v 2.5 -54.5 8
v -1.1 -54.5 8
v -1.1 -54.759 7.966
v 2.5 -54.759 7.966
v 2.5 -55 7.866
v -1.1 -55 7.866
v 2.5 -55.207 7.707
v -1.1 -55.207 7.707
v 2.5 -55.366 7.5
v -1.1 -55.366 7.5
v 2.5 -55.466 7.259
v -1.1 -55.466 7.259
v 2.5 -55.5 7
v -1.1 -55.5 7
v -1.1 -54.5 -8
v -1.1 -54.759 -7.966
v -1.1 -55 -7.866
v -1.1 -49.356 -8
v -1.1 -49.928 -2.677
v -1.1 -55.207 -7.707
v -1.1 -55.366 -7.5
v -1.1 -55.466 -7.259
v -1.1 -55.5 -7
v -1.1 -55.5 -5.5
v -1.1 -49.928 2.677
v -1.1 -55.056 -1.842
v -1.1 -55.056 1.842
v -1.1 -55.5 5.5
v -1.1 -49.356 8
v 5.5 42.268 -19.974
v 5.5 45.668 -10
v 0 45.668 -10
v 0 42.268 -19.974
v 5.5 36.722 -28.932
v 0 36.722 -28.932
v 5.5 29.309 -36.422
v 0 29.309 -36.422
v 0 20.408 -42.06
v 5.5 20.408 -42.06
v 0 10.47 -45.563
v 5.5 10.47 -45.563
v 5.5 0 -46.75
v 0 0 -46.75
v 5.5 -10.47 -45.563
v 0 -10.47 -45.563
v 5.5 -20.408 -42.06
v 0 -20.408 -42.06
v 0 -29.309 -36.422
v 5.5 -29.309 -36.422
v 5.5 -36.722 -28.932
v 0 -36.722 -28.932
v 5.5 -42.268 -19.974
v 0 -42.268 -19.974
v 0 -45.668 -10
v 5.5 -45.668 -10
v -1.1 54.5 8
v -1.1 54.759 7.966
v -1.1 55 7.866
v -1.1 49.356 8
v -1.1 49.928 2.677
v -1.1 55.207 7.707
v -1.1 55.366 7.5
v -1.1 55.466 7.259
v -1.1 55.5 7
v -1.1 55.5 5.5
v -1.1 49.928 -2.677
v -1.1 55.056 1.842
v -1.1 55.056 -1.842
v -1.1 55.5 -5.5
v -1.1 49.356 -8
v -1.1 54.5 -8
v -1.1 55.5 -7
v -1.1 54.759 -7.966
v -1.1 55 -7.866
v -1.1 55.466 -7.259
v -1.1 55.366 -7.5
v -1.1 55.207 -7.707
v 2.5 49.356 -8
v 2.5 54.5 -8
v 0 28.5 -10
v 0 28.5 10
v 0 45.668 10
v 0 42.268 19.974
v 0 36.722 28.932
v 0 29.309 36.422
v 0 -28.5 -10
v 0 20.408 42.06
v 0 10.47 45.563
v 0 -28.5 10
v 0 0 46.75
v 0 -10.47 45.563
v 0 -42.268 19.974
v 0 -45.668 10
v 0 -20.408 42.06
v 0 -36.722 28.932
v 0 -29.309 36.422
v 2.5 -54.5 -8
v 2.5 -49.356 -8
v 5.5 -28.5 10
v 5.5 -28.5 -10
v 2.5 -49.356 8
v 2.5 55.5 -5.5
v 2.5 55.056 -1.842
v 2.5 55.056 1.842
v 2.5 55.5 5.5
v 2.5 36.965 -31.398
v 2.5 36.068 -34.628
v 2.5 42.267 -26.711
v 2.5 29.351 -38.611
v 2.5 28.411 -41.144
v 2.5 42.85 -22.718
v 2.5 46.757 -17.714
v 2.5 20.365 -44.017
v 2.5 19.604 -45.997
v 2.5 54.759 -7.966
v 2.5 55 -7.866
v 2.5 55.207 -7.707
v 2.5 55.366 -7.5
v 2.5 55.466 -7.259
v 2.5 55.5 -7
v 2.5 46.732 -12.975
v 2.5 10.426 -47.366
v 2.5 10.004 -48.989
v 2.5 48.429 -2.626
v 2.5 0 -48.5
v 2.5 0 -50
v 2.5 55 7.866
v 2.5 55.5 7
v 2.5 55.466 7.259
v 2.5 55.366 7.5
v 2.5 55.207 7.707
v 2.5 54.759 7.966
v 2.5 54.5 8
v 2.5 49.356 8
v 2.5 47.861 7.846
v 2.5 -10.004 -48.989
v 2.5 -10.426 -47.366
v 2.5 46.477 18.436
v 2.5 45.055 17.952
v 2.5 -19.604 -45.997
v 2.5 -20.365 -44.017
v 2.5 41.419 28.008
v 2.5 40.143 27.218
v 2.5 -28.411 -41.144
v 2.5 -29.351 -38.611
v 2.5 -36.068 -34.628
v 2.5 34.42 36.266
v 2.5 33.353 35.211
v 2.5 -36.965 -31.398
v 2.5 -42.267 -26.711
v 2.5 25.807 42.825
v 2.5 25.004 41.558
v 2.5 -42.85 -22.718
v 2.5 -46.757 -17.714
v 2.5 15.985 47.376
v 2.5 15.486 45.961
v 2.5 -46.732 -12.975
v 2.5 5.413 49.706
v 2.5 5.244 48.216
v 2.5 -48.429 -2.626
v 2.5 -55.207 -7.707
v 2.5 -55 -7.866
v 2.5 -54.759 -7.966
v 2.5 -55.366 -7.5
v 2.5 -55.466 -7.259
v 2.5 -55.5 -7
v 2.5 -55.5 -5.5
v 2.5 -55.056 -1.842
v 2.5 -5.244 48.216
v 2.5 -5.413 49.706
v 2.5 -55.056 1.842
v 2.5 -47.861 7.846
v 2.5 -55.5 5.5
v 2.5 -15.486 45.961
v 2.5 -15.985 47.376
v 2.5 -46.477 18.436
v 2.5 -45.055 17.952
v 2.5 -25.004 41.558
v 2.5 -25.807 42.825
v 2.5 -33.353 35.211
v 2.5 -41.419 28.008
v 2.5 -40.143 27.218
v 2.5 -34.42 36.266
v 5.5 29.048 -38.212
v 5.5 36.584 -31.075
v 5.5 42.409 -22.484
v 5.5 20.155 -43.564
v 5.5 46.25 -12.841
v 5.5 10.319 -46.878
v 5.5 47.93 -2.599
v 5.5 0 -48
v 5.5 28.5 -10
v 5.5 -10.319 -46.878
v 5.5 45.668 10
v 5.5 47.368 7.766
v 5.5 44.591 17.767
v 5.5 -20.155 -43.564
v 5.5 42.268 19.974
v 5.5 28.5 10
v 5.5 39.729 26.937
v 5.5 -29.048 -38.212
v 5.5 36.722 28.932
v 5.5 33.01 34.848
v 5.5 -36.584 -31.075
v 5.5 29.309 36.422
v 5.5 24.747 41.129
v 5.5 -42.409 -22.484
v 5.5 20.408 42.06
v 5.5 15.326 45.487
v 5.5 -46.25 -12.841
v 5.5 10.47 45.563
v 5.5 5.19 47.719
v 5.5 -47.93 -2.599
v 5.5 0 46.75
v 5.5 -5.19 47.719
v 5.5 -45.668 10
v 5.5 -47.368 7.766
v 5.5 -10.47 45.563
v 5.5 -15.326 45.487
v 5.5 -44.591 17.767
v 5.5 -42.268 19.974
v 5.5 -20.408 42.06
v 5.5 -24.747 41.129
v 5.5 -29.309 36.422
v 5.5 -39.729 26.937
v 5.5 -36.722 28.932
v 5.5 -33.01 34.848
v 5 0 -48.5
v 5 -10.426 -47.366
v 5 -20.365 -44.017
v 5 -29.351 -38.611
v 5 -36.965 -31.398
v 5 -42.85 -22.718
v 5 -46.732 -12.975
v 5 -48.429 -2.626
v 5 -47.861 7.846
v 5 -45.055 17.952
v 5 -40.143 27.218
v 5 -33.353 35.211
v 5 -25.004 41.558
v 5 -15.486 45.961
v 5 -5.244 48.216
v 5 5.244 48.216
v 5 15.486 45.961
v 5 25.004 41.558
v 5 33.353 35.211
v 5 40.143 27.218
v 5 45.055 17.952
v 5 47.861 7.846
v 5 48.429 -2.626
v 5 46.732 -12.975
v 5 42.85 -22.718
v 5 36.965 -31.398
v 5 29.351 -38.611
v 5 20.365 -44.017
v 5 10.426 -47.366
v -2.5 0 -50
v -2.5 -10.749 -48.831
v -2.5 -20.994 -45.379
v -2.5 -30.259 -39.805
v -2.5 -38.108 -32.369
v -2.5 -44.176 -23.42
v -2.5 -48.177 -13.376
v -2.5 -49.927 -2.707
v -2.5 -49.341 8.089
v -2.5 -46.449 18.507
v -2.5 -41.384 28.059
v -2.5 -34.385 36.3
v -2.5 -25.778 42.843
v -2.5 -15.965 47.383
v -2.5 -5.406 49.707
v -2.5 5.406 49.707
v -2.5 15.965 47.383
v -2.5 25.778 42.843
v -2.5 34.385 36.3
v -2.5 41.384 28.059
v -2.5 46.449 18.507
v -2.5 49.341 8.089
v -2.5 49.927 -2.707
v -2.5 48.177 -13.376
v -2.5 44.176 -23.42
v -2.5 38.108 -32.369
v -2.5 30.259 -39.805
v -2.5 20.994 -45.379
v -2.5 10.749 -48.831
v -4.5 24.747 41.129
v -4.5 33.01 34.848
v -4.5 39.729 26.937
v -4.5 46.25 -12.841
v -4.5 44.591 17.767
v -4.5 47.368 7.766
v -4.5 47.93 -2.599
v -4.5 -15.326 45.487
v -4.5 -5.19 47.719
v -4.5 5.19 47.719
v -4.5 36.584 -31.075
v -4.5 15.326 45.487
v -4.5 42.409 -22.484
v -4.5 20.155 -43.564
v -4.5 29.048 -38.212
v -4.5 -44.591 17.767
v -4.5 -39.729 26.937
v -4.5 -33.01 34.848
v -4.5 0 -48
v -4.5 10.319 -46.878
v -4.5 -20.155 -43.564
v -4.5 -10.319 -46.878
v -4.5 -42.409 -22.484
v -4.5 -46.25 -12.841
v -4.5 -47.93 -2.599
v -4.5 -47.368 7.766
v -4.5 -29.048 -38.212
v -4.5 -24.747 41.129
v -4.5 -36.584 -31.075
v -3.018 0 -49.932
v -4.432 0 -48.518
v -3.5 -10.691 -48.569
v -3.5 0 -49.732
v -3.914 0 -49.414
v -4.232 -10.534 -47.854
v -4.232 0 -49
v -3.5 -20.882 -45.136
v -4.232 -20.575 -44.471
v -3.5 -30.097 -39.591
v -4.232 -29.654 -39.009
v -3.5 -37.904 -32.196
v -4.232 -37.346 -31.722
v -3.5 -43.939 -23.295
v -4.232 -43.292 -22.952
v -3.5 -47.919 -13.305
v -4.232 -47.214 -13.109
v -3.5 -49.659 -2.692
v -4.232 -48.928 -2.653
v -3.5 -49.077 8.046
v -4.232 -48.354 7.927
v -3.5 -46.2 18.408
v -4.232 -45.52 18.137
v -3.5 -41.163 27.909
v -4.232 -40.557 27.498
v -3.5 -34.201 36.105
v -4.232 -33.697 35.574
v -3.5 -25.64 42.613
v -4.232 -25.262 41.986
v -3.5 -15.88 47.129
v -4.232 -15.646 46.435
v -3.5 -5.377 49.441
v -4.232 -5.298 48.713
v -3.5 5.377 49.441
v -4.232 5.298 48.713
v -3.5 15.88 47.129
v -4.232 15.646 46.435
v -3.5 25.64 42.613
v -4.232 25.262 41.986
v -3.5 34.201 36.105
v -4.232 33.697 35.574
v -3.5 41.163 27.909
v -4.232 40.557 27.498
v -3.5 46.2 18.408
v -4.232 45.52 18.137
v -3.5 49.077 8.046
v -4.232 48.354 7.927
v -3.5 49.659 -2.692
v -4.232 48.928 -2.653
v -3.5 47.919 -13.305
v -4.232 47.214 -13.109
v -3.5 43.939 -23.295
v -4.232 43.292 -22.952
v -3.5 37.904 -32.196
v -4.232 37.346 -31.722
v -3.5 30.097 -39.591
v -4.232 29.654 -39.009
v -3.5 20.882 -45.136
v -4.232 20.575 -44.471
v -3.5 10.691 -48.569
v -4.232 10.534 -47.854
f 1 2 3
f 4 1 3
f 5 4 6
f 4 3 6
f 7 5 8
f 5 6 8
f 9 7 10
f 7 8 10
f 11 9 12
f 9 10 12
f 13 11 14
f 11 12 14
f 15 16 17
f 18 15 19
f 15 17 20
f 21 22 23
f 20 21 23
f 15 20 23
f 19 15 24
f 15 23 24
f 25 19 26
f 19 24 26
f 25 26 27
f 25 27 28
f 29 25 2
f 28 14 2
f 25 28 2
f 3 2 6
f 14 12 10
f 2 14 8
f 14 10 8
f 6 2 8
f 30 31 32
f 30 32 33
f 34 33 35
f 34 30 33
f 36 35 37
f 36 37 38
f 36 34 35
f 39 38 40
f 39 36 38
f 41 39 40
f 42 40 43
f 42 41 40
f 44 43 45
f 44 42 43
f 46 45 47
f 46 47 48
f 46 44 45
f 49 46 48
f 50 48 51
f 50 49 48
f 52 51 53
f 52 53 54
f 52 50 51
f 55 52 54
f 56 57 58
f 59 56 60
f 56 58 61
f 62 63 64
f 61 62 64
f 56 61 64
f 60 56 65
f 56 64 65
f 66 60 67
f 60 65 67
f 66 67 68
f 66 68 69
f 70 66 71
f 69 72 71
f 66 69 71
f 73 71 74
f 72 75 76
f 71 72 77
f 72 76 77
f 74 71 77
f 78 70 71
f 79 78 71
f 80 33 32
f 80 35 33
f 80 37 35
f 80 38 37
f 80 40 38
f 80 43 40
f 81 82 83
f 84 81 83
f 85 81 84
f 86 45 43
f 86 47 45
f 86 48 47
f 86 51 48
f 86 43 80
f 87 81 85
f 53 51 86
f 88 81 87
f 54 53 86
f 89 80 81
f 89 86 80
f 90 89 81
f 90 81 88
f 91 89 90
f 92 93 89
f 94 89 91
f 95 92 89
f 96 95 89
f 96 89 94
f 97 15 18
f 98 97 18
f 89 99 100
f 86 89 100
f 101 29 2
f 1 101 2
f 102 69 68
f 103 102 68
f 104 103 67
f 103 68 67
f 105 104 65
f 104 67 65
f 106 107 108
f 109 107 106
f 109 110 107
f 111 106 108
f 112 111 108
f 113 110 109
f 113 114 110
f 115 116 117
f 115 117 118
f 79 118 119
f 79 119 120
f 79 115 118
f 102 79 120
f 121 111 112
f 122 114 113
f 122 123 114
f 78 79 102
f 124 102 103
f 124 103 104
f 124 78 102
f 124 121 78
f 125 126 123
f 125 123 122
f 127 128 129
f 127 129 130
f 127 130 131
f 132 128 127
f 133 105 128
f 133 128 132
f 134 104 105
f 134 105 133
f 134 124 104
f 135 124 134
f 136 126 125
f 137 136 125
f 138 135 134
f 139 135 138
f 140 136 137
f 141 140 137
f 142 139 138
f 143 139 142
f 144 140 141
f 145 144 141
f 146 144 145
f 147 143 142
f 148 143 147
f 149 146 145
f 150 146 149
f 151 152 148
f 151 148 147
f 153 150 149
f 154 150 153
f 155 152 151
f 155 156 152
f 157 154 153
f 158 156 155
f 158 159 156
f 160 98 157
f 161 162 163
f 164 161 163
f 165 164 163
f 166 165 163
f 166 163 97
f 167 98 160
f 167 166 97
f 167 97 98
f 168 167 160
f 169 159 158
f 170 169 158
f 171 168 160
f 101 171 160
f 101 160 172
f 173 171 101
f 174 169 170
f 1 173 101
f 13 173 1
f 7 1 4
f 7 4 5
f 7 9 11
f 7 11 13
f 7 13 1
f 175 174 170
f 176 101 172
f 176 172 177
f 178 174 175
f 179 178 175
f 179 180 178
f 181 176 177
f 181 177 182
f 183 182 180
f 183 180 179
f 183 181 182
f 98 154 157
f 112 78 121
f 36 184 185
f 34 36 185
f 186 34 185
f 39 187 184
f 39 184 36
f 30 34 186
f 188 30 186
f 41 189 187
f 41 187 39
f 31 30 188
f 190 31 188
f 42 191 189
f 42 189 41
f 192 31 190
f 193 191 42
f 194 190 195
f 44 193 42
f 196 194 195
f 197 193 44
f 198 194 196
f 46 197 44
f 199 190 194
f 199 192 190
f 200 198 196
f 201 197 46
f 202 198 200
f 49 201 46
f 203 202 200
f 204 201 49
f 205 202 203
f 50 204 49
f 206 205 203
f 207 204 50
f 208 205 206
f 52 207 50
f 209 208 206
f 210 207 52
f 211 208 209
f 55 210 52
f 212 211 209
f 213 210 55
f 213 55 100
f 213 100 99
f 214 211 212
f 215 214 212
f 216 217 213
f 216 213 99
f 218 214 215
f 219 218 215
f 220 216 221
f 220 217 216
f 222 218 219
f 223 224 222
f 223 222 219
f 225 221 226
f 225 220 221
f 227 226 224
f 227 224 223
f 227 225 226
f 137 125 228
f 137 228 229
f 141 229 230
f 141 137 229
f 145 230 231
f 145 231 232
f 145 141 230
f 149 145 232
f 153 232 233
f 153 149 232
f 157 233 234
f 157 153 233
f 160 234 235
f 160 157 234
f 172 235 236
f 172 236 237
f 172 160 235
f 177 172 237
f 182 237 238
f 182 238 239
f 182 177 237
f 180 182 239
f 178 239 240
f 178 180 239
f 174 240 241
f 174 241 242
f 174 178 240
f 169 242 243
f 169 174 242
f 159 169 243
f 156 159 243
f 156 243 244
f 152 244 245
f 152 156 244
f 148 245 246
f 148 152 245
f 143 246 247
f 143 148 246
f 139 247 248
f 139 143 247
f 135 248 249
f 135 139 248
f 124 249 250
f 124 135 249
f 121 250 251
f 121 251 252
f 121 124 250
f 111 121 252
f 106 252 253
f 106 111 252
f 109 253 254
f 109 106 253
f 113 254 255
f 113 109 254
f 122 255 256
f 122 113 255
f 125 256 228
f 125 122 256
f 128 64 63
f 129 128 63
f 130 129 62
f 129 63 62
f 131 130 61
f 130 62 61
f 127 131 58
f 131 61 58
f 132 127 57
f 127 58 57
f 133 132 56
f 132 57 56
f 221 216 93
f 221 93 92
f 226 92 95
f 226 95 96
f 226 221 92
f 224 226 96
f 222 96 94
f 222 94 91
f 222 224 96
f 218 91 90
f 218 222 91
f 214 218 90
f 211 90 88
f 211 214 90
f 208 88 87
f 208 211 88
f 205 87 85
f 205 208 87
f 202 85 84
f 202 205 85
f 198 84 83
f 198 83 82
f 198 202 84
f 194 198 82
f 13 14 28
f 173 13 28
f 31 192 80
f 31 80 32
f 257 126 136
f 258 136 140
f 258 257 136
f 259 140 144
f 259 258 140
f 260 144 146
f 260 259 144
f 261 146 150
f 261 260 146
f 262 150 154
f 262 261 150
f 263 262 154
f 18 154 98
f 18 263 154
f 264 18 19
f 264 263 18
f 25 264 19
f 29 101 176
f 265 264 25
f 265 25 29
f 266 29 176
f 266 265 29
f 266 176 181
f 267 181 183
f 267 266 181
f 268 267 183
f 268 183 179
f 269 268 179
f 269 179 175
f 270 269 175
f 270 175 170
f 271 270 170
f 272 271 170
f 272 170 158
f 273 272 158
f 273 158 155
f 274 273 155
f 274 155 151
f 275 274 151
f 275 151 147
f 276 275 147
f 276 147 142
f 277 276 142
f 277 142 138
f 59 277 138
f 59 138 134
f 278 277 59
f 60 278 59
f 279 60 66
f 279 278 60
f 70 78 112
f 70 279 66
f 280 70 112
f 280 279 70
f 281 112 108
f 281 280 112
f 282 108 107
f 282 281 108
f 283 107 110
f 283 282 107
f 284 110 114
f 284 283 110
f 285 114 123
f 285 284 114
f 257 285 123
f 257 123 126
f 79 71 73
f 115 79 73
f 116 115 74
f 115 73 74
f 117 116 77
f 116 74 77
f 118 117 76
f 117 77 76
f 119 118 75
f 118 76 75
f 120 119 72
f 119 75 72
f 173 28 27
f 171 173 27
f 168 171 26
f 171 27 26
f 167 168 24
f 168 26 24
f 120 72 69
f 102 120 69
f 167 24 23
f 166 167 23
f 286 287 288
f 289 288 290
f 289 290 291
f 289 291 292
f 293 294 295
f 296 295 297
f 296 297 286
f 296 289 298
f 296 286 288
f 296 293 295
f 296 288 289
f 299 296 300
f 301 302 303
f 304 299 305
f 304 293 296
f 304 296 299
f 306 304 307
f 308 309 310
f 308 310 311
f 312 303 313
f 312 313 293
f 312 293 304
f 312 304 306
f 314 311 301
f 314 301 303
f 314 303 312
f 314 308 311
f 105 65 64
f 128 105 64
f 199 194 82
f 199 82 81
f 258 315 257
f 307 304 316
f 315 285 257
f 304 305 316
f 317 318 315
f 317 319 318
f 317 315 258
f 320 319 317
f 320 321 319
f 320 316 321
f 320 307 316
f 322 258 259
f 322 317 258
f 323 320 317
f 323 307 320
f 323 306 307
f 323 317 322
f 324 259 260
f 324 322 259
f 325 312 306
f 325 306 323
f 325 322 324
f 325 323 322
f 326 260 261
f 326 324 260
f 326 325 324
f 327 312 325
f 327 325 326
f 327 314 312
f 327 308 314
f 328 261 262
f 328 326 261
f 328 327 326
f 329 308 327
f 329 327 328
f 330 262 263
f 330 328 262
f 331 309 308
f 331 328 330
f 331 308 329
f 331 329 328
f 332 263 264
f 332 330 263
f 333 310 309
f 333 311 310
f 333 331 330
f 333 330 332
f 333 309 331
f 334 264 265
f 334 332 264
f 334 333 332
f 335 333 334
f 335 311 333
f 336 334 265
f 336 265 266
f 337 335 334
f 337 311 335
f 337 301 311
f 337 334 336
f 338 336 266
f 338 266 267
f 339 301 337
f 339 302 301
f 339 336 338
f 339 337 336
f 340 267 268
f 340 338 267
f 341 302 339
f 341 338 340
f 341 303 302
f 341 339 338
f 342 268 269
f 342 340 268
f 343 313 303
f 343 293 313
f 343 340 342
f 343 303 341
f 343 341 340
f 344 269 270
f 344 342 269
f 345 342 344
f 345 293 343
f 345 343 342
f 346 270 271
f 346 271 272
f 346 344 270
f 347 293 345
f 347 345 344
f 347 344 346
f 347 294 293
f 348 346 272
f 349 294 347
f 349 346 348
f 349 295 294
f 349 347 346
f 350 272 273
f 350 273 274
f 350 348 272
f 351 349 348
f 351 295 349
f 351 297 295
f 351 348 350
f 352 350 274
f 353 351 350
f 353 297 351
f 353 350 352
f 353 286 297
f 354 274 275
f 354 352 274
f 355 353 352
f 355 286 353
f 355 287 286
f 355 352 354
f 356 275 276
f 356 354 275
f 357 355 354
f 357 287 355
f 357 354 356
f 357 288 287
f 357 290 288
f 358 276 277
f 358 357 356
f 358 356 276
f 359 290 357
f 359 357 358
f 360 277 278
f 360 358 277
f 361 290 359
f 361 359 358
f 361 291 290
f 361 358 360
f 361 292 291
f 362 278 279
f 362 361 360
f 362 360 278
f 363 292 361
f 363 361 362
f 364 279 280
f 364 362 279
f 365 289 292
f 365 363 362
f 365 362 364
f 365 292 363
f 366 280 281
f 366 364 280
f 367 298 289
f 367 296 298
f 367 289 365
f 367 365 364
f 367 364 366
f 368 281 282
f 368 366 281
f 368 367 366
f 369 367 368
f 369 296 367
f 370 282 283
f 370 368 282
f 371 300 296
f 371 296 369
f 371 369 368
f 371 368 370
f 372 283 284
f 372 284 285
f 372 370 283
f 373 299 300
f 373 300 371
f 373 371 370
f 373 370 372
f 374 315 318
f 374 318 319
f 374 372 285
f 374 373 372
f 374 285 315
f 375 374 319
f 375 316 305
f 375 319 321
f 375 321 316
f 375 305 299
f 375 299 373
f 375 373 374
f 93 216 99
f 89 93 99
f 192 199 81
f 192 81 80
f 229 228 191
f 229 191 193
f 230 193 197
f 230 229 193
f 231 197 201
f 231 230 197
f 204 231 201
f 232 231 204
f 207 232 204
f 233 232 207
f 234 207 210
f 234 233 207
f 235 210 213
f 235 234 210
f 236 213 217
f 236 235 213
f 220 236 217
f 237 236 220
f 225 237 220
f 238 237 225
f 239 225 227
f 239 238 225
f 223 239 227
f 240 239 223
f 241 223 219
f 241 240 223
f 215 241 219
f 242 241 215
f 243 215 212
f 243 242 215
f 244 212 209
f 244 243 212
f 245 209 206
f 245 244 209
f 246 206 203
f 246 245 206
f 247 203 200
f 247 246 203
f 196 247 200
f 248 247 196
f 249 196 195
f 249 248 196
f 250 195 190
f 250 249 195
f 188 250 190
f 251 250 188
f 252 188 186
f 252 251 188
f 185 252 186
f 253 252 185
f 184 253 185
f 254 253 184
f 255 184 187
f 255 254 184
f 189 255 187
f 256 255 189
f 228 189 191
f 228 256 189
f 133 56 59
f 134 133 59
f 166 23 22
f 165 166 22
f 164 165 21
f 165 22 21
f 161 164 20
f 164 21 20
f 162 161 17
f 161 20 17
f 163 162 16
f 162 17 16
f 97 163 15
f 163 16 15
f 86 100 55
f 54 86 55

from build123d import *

# Parameters (mm, degrees)
CHANFREIN1_SIZE              = 0.5
BOSS_EXTRU_1_START           = 5.5
BOSS_EXTRU_1_DEPTH           = 5.5
BOSS_EXTRU_2_START           = -3.6
BOSS_EXTRU_2_DEPTH           = 3.6
R_P_TITION_CIRCULAIRE1_COUNT = 2


with BuildPart() as part:
    # Esquisse1 → Révolution1 (revolve)
    with BuildSketch(Plane.XY, mode=Mode.PRIVATE) as r_volution1_sk:
        with BuildLine():
            Line((0, 0), (0, 46.75))
            Line((0, 46.75), (5.5, 46.75))
            Line((5.5, 46.75), (5.5, 48.5))
            Line((5.5, 48.5), (2.5, 48.5))
            Line((2.5, 48.5), (2.5, 50))
            Line((2.5, 50), (-2.5, 50))
            ThreePointArc((-2.5, 50), (-3.914213562, 49.414213562), (-4.5, 48))
            Line((-4.5, 48), (-4.5, 0))
            Line((-4.5, 0), (0, 0))
        make_face()
    revolve(r_volution1_sk.sketch.rotate(Axis((0, 0, 0), (-1, 0, 0)), 90), axis=Axis((0, 0, 0), (-1, 0, 0)))

    # Chanfrein1
    chanfrein1_edges = [part.edges().sort_by_distance(p)[0] for p in [
        (5.5, 0, 48.5),
    ]]
    chamfer(chanfrein1_edges, length=CHANFREIN1_SIZE)

    # Esquisse2 → Boss.-Extru.1 (add)
    with BuildSketch(Plane(origin=(0, 0, 0), x_dir=(0, 0, -1), z_dir=(1, 0, 0)).offset(BOSS_EXTRU_1_START)):
        with BuildLine():
            Line((-10, 45.667959227), (-10, 28.5))
            Line((-10, 28.5), (10, 28.5))
            Line((10, 28.5), (10, 45.667959227))
            ThreePointArc((10, 45.667959227), (0, 46.75), (-10, 45.667959227))
        make_face()
        with BuildLine():
            Line((-10, -28.5), (10, -28.5))
            Line((10, -28.5), (10, -45.667959227))
            ThreePointArc((10, -45.667959227), (0, -46.75), (-10, -45.667959227))
            Line((-10, -45.667959227), (-10, -28.5))
        make_face()
    extrude(amount=-BOSS_EXTRU_1_DEPTH)

    # Esquisse3 → Boss.-Extru.2 (add)
    with BuildSketch(Plane(origin=(2.5, 0, 0), x_dir=(0, 0, -1), z_dir=(1, 0, 0)).offset(BOSS_EXTRU_2_START)):
        with BuildLine():
            Line((-8, 54.5), (-8, 49.355850717))
            ThreePointArc((-8, 49.355850717), (0, 50), (8, 49.355850717))
            Line((8, 49.355850717), (8, 54.5))
            ThreePointArc((8, 54.5), (7.707106781, 55.207106781), (7, 55.5))
            Line((7, 55.5), (5.5, 55.5))
            ThreePointArc((5.5, 55.5), (0, 55), (-5.5, 55.5))
            Line((-5.5, 55.5), (-7, 55.5))
            ThreePointArc((-7, 55.5), (-7.707106781, 55.207106781), (-8, 54.5))
        make_face()
    boss_extru_2 = extrude(amount=BOSS_EXTRU_2_DEPTH)

    # Répétition circulaire1: Boss.-Extru.2 ×2 about axis
    r_p_tition_circulaire1_axis = Axis((0, 0, 0), (1, 0, 0))
    for i in range(1, R_P_TITION_CIRCULAIRE1_COUNT):
        add(boss_extru_2.rotate(r_p_tition_circulaire1_axis, i * 360 / R_P_TITION_CIRCULAIRE1_COUNT))


solid = part.part
